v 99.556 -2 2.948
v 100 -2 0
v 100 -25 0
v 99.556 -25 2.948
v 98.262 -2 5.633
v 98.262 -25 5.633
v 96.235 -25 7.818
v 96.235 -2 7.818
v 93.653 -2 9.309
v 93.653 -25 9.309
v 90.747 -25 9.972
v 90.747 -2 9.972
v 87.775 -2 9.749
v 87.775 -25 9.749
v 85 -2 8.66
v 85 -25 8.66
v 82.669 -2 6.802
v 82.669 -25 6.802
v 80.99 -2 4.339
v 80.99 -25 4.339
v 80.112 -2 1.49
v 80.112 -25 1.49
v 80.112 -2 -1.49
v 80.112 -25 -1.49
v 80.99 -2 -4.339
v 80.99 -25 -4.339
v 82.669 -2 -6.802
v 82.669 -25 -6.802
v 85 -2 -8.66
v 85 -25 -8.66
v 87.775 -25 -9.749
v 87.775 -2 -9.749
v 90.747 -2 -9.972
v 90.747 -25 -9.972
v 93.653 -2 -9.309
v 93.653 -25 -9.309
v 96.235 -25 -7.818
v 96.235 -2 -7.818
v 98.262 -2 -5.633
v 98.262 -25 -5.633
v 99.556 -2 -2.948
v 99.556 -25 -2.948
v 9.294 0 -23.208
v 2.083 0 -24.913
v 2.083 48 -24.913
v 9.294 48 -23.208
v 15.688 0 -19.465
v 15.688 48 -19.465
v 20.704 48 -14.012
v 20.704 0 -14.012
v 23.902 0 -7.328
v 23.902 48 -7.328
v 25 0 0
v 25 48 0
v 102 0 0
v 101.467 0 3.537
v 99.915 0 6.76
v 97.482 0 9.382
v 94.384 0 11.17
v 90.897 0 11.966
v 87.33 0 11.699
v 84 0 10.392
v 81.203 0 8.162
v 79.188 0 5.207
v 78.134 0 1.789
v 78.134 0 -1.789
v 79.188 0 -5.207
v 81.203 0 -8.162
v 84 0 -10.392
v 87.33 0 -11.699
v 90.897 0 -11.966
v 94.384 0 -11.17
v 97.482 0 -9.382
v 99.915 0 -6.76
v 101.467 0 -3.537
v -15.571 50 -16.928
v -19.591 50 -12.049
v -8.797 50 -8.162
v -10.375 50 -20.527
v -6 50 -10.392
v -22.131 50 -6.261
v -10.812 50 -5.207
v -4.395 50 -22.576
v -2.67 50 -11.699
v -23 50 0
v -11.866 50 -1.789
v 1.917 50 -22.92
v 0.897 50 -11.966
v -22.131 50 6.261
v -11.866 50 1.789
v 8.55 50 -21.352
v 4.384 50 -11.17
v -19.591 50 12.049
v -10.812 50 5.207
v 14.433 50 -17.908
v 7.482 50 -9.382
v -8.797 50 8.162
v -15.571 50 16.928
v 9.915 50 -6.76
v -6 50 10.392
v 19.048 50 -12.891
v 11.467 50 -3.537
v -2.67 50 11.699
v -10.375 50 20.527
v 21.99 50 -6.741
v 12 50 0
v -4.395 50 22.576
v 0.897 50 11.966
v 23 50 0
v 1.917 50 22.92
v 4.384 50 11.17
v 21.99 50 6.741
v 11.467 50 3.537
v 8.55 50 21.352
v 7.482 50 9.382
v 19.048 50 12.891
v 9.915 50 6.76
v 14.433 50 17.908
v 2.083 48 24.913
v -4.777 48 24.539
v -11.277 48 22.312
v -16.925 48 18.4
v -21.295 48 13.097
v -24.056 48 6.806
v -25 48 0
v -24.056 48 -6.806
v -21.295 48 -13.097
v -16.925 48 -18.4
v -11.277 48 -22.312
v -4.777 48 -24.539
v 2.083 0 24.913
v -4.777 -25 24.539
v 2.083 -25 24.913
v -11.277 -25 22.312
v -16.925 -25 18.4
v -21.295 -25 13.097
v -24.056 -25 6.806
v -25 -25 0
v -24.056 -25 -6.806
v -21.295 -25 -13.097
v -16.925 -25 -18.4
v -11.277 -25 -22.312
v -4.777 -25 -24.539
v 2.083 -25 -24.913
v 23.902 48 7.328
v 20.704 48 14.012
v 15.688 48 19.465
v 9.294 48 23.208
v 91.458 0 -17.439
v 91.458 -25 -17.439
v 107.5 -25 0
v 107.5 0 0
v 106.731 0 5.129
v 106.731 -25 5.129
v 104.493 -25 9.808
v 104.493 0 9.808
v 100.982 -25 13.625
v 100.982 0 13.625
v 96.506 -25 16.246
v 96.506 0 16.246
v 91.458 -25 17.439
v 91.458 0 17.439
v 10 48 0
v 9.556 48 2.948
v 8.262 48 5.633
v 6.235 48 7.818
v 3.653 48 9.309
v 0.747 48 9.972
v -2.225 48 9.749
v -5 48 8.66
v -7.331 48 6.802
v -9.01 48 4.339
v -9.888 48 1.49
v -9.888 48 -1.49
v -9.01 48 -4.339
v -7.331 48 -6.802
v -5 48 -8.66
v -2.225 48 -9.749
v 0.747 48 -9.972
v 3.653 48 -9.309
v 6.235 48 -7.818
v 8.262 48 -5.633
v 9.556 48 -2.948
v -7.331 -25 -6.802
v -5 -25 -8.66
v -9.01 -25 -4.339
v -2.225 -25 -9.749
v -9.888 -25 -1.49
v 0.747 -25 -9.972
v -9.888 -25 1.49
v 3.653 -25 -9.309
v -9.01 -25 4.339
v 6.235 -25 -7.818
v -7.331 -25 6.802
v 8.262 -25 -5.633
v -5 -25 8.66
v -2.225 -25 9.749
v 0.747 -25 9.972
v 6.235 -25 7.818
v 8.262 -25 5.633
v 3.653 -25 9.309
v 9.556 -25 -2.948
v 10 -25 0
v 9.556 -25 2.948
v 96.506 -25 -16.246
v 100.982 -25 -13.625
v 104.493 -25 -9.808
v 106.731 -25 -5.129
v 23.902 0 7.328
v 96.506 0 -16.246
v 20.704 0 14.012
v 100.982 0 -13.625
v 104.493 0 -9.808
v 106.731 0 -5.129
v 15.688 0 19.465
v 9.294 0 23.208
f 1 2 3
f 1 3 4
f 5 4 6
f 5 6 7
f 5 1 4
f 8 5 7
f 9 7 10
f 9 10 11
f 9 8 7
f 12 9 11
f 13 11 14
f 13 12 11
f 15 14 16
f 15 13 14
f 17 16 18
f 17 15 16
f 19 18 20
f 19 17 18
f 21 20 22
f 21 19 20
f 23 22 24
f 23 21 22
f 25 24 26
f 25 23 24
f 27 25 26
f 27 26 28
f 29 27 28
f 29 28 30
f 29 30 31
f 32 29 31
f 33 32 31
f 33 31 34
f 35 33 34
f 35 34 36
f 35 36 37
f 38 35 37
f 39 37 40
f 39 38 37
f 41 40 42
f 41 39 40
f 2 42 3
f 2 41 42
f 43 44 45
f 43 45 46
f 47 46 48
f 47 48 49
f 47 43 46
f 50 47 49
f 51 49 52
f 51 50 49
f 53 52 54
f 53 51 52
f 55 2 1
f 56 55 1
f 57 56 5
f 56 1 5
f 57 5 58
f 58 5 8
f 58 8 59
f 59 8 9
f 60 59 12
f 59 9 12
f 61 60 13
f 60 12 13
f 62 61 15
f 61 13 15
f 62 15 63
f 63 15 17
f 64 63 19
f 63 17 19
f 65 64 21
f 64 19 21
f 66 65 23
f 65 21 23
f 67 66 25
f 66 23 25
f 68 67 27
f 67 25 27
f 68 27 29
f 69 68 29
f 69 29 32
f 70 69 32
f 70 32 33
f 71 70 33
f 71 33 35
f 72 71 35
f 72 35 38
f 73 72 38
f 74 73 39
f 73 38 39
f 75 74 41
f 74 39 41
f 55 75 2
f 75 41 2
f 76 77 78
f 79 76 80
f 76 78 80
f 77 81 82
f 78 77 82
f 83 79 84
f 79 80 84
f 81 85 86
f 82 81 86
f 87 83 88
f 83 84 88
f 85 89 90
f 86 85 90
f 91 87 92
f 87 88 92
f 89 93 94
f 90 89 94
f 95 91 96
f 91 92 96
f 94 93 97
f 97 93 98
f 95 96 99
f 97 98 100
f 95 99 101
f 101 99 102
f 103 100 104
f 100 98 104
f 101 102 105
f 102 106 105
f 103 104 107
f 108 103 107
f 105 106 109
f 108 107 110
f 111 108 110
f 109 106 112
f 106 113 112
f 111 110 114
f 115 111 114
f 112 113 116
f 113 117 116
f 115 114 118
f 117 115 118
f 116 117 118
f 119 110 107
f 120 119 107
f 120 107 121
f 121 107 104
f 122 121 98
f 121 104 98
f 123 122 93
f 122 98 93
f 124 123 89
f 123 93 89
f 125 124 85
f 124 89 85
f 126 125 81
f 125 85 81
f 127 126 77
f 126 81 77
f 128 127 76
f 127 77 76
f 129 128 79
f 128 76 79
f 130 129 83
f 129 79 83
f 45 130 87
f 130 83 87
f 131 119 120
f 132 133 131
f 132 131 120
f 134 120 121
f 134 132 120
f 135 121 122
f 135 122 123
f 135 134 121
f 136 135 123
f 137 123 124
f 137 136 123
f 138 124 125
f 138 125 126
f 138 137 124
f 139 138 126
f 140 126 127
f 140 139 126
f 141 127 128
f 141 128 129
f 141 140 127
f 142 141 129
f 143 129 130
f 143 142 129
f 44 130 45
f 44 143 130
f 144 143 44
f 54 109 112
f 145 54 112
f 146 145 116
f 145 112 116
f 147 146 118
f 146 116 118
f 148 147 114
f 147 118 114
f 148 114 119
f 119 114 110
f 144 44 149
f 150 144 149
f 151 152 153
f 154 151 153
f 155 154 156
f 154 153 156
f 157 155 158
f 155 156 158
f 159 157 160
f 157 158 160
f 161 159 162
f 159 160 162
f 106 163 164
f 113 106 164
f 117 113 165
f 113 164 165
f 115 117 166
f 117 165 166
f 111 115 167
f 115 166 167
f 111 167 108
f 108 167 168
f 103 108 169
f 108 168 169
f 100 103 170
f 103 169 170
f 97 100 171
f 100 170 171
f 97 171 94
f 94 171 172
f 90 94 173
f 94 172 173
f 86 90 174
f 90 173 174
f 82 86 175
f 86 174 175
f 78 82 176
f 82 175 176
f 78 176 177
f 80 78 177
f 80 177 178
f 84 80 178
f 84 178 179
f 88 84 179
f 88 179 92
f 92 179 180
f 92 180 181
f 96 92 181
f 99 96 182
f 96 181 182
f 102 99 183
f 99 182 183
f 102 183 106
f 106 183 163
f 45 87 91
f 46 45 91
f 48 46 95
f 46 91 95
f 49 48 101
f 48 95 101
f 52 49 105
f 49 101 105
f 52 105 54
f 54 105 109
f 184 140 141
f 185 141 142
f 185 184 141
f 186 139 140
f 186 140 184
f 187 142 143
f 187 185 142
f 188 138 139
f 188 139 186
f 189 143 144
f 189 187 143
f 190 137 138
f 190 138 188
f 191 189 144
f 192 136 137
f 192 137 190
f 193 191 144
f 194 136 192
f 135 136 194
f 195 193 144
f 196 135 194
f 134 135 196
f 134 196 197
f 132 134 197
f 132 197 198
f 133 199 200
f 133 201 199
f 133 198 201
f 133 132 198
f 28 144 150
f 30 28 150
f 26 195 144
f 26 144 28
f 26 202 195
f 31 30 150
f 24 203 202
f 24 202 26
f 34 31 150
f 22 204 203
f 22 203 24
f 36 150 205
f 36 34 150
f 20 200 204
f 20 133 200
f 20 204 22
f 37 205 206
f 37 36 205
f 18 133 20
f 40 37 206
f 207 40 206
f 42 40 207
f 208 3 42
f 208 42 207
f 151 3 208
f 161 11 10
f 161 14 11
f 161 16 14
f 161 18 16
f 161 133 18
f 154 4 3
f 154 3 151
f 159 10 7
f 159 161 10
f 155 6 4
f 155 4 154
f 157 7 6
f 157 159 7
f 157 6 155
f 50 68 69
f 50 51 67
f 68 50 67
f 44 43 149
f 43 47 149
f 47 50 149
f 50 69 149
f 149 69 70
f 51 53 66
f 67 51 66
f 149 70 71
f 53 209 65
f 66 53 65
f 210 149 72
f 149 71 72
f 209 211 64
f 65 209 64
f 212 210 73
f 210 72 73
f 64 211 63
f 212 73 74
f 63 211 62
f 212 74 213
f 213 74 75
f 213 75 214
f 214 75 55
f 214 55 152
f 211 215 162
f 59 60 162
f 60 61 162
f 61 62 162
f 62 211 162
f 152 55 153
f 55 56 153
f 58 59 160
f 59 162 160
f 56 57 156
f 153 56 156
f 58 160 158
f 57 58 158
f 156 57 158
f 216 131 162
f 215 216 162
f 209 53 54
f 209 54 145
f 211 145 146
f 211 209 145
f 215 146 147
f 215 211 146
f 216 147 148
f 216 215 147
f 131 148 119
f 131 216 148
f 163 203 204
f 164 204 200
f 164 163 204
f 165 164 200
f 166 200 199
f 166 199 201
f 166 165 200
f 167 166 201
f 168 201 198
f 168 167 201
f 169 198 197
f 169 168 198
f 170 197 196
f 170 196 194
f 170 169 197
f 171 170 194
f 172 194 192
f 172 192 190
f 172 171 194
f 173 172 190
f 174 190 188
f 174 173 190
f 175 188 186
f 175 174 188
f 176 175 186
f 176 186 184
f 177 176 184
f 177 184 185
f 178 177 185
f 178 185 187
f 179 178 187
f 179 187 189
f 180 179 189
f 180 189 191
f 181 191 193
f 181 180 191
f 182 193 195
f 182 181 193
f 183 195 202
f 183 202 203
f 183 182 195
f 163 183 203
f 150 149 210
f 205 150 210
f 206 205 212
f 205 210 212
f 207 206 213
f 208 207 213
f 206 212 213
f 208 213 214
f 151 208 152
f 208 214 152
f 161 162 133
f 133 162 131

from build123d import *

# Parameters (mm, degrees)
F0_R     = 10
F1_DEPTH = 25
F2_DEPTH = 50
F3_SIZE  = 2


with BuildPart() as f1:
    # F0 (on Front) → F1 (new body)
    with BuildSketch(Plane.XZ):
        with BuildLine():
            ThreePointArc((2.083333, -24.913043), (18.399502, -16.92508), (25, 0))
            ThreePointArc((25, 0), (18.399502, 16.92508), (2.083333, 24.913043))
            ThreePointArc((2.083333, 24.913043), (-25, 0), (2.083333, -24.913043))
        make_face()
        Circle(F0_R, mode=Mode.SUBTRACT)
        with BuildLine():
            ThreePointArc((2.083333, 24.913043), (18.399502, 16.92508), (25, 0))
            ThreePointArc((25, 0), (18.399502, -16.92508), (2.083333, -24.913043))
            Line((2.083333, -24.913043), (91.458333, -17.43913))
            ThreePointArc((91.458333, -17.43913), (72.5, 0), (91.458333, 17.43913))
            Line((91.458333, 17.43913), (2.083333, 24.913043))
        make_face()
        with BuildLine():
            ThreePointArc((107.5, 0), (102.879651, 11.847556), (91.458333, 17.43913))
            ThreePointArc((91.458333, 17.43913), (72.5, 0), (91.458333, -17.43913))
            ThreePointArc((91.458333, -17.43913), (102.879651, -11.847556), (107.5, 0))
        make_face()
        with Locations((90, 0)):
            Circle(F0_R, mode=Mode.SUBTRACT)
    extrude(amount=F1_DEPTH)

    # F0 (on Front) → F2 (join)
    with BuildSketch(Plane.XZ):
        with BuildLine():
            ThreePointArc((2.083333, -24.913043), (18.399502, -16.92508), (25, 0))
            ThreePointArc((25, 0), (18.399502, 16.92508), (2.083333, 24.913043))
            ThreePointArc((2.083333, 24.913043), (-25, 0), (2.083333, -24.913043))
        make_face()
        Circle(F0_R, mode=Mode.SUBTRACT)
    extrude(amount=-F2_DEPTH)

    # F3
    f3_edges = [f1.edges().sort_by_distance(p)[0] for p in [
        (-10, 50, 0),
        (-2.083333, 50, 24.913043),
        (80, 0, 0),
    ]]
    chamfer(f3_edges, length=F3_SIZE)


solid = f1.part
